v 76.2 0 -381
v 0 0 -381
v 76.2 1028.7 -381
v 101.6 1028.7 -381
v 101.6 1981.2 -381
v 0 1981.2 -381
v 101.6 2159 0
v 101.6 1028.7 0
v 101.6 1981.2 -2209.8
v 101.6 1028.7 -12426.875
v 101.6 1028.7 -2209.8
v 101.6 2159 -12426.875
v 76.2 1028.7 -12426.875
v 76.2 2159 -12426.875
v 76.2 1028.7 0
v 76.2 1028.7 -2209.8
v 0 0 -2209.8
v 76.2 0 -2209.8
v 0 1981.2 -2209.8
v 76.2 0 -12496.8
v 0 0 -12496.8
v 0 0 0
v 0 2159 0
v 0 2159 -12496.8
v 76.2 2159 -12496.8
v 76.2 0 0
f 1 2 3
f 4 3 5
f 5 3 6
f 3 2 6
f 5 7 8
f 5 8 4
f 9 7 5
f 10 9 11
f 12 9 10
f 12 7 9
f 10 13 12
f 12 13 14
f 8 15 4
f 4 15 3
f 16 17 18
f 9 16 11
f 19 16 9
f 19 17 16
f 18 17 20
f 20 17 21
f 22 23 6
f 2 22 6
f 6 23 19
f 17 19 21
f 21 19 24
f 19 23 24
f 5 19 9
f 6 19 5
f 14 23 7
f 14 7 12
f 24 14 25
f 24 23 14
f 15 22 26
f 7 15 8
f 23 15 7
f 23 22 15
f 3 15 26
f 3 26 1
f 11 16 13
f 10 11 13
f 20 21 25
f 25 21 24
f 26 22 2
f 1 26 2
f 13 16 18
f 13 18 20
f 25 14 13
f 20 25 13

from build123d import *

# Parameters (mm, degrees)
SKETCH1_W           = 12496.8
SKETCH1_H           = 2159
BOSS_EXTRUDE1_DEPTH = 76.2
SKETCH3_W           = 12426.875050424
SKETCH3_H           = 1130.3
BOSS_EXTRUDE2_DEPTH = 25.4
SKETCH2_W           = 1828.8
SKETCH2_H           = 1981.2
CUT_EXTRUDE1_DEPTH  = 12683.334714082


with BuildPart() as part:
    # Sketch1 → Boss-Extrude1 (new body)
    with BuildSketch(Plane(origin=(0, 0, 0), x_dir=(0, 0, -1), z_dir=(1, 0, 0))):
        with Locations((6248.4, 1079.5)):
            Rectangle(SKETCH1_W, SKETCH1_H)
    extrude(amount=BOSS_EXTRUDE1_DEPTH)

    # Sketch3 → Boss-Extrude2 (add)
    with BuildSketch(Plane(origin=(76.2, 0, 0), x_dir=(0, 0, -1), z_dir=(1, 0, 0))):
        with Locations((6213.437525212, 1593.85)):
            Rectangle(SKETCH3_W, SKETCH3_H)
    extrude(amount=BOSS_EXTRUDE2_DEPTH)

    # Sketch2 → Cut-Extrude1 (cut, through all)
    with BuildSketch(Plane.ZY):
        with Locations((-1295.4, 990.6)):
            Rectangle(SKETCH2_W, SKETCH2_H)
    extrude(amount=-CUT_EXTRUDE1_DEPTH, mode=Mode.SUBTRACT)


solid = part.part
